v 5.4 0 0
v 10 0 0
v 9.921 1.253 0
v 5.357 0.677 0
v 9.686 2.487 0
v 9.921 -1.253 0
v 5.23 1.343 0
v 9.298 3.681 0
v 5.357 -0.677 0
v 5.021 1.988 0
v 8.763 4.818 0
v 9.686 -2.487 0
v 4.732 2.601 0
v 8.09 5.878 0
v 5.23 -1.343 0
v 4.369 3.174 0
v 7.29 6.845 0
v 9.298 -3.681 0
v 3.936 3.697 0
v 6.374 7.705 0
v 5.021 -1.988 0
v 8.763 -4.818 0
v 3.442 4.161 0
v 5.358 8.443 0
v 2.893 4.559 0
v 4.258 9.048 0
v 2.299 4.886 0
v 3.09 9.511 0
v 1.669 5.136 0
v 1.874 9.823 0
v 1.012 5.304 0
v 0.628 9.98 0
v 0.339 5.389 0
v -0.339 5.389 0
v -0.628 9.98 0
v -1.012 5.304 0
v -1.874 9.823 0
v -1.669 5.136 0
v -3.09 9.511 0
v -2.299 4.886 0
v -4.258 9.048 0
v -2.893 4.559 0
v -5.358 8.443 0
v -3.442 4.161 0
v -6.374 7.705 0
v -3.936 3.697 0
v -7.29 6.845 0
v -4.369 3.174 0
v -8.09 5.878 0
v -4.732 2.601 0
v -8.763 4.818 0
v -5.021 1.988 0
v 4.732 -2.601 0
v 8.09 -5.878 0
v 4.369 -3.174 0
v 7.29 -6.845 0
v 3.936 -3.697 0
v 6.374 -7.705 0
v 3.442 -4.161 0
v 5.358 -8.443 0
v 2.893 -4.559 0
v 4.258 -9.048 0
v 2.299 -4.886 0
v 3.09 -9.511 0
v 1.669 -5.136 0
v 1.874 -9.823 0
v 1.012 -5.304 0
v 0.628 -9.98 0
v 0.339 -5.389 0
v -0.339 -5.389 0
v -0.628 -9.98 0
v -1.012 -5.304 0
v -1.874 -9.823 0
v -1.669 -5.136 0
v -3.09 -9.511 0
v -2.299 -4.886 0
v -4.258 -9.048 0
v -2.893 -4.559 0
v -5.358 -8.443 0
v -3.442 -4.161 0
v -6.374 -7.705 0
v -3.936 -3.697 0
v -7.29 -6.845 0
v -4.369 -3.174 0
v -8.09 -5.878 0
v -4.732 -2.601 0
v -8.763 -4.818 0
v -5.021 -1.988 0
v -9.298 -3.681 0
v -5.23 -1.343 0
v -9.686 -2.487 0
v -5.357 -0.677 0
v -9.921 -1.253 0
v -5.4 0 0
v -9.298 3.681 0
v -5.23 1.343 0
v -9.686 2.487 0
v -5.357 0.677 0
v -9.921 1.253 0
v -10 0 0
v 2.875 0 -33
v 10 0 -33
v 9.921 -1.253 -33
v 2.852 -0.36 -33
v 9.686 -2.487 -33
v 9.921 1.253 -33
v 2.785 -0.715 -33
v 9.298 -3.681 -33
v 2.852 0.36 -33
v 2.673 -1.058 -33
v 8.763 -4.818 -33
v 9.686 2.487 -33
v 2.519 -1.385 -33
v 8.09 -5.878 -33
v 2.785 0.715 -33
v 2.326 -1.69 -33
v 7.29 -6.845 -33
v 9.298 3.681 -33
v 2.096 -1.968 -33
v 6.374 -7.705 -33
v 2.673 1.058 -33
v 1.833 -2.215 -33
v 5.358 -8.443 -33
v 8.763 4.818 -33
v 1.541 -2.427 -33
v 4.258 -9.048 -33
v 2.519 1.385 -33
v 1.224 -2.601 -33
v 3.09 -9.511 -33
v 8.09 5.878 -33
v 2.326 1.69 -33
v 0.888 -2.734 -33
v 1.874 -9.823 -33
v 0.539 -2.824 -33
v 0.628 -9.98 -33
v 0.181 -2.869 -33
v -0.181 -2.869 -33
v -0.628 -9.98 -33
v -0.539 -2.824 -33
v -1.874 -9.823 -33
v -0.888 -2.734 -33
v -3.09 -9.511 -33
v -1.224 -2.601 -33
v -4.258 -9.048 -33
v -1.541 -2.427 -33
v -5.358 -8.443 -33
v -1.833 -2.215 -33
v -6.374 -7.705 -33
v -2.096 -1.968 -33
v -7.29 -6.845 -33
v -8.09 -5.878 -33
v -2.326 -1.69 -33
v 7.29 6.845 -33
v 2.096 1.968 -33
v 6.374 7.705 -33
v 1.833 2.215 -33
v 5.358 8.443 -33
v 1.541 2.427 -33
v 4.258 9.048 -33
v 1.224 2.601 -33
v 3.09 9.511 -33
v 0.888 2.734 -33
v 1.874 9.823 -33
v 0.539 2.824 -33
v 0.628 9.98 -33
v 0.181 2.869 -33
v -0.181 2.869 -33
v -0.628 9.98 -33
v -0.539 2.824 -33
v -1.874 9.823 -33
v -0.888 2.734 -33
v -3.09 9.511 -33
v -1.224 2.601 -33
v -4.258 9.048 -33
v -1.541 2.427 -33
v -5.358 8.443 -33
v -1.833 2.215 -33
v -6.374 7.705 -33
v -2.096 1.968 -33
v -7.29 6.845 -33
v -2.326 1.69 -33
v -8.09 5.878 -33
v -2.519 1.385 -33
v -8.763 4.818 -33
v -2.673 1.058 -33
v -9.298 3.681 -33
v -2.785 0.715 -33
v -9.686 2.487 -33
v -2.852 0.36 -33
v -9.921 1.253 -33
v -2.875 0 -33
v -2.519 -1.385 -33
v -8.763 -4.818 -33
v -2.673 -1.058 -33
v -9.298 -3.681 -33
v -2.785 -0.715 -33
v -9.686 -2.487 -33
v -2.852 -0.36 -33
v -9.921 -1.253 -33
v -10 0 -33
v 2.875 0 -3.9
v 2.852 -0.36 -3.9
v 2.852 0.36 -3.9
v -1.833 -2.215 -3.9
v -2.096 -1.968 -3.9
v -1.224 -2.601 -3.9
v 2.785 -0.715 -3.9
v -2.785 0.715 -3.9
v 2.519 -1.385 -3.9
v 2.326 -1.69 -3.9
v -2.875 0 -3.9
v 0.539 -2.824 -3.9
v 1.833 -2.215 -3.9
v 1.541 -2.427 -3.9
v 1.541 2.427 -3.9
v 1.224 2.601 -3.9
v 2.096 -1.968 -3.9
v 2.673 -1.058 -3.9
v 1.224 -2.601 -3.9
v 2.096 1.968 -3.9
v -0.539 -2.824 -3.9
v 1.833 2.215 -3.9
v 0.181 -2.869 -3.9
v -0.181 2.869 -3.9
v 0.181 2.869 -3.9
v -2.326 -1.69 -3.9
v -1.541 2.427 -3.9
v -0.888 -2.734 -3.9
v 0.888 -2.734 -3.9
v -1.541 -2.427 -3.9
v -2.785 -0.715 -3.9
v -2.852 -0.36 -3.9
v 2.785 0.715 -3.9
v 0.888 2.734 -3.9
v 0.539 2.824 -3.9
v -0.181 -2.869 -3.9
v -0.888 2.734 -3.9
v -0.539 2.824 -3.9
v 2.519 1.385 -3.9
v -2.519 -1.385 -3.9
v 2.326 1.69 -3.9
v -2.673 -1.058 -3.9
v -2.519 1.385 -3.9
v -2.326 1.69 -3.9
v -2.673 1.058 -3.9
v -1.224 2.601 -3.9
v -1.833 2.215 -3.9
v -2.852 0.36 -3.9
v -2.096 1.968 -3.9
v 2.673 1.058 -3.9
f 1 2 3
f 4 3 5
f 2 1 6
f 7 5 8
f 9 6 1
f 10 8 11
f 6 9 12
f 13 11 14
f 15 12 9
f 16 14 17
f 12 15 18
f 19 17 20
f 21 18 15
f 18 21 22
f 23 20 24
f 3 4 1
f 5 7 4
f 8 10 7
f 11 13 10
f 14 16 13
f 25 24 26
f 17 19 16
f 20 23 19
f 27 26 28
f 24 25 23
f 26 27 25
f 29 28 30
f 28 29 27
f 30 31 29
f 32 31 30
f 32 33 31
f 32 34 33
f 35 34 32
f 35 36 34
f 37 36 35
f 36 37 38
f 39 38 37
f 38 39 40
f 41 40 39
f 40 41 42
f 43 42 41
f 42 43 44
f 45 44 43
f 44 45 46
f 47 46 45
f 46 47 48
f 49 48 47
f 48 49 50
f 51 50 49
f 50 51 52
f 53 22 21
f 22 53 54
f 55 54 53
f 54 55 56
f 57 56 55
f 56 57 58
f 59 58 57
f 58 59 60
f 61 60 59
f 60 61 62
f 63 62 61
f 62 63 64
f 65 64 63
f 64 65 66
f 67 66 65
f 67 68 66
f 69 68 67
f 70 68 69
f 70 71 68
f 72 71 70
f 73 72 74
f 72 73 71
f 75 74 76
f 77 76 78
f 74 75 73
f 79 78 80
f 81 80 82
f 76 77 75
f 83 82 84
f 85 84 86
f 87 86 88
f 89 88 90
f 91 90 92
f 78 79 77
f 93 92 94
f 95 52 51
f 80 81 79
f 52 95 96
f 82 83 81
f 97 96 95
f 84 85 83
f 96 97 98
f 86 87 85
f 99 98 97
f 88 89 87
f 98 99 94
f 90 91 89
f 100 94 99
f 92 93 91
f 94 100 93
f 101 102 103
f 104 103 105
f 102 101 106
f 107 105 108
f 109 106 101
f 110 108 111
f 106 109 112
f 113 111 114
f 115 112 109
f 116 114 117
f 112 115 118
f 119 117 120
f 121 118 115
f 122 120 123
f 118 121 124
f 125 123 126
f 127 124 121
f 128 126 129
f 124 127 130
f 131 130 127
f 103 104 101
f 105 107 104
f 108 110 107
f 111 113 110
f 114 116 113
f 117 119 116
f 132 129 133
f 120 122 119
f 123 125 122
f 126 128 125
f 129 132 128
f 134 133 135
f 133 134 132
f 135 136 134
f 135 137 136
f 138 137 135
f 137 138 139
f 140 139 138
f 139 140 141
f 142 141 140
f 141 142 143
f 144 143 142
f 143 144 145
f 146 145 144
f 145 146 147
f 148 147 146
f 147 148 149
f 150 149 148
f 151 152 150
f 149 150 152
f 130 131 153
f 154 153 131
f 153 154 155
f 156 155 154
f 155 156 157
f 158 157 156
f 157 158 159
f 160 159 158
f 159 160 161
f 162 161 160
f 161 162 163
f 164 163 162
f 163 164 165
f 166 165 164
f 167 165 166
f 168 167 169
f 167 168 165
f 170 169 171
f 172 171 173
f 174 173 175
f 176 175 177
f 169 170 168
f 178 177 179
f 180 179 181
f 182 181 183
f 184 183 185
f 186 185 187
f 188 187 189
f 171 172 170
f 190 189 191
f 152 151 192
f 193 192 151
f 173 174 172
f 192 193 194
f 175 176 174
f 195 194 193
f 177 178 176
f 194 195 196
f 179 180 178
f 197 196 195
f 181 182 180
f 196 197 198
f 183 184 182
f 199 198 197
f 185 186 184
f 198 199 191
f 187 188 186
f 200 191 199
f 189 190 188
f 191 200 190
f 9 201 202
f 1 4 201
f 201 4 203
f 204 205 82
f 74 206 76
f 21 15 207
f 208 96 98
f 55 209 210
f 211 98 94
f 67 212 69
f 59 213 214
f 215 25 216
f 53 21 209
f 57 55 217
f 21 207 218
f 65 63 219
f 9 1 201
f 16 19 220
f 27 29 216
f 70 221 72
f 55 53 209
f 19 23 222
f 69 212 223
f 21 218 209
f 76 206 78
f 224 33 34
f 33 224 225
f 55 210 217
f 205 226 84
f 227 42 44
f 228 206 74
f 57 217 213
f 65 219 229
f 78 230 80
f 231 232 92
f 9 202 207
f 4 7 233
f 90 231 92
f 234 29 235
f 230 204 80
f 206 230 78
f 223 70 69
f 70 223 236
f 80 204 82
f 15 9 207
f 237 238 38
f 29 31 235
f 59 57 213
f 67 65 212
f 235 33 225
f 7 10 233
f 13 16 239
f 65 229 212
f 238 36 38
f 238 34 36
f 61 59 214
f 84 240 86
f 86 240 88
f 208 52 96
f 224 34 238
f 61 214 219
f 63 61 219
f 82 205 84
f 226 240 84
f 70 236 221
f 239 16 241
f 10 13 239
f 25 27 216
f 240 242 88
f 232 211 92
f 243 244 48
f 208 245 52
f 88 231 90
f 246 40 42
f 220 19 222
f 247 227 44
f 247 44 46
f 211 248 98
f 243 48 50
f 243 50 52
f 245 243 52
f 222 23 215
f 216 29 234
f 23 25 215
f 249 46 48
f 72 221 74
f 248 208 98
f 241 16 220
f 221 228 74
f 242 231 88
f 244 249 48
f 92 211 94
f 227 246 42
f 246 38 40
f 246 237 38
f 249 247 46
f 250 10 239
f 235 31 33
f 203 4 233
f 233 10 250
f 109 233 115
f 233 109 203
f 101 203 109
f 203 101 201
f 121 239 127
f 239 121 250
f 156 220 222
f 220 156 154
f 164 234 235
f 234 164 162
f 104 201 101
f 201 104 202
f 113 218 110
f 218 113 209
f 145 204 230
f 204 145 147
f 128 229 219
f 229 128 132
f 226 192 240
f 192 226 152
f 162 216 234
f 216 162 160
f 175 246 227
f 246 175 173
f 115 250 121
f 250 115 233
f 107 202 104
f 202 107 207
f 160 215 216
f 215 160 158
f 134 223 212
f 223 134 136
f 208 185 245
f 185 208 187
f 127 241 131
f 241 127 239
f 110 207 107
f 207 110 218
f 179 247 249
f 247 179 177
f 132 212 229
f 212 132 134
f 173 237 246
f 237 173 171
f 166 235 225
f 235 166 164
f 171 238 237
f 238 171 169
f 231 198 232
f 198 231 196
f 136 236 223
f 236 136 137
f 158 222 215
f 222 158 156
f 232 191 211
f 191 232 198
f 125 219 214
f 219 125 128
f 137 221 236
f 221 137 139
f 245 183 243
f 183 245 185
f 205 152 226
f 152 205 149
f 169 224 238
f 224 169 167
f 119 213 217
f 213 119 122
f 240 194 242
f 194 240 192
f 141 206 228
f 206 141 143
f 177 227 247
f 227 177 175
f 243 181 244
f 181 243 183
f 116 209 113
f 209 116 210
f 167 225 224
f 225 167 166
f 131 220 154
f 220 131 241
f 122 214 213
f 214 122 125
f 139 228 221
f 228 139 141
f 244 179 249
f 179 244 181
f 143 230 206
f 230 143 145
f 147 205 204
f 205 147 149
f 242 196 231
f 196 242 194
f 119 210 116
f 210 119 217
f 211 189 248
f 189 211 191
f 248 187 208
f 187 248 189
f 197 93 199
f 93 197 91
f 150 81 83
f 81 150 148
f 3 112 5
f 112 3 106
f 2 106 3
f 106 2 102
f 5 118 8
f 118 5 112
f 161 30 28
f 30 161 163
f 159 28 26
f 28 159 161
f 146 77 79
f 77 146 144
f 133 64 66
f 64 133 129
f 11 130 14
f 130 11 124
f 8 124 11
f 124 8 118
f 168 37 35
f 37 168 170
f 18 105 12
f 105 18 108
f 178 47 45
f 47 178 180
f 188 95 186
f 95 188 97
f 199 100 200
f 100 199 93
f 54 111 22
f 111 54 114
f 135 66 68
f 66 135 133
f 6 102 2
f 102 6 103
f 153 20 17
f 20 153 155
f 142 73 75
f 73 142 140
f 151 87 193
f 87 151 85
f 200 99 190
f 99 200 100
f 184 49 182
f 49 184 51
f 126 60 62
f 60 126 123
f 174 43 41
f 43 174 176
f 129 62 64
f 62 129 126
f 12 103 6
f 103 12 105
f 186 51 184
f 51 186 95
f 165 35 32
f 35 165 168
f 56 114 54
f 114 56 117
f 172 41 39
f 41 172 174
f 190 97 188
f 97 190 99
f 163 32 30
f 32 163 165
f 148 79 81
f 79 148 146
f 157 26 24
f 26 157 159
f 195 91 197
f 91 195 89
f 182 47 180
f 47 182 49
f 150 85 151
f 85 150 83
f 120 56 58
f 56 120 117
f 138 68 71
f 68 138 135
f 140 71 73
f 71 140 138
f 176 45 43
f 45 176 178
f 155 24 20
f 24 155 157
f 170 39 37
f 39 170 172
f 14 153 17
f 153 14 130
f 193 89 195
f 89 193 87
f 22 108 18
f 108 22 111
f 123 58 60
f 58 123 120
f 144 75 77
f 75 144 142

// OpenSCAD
$fn = 50;


difference() {
	union() {
		translate(v = [0, 0, -33.0000000000]) {
			cylinder(h = 33, r = 10.0000000000);
		}
		cylinder(h = 0, r = 20.0000000000);
	}
	union() {
		translate(v = [0, 0, 0]) {
			rotate(a = [0, 0, 0]) {
				difference() {
					union() {
						#translate(v = [0, 0, -33.0000000000]) {
							cylinder(h = 33, r = 2.6000000000);
						}
						#translate(v = [0, 0, -3.9000000000]) {
							cylinder(h = 3.9000000000, r1 = 2.8750000000, r2 = 5.4000000000);
						}
						#translate(v = [0, 0, -33.0000000000]) {
							cylinder(h = 33, r = 2.8750000000);
						}
						#translate(v = [0, 0, -33.0000000000]) {
							cylinder(h = 33, r = 2.6000000000);
						}
					}
					union();
				}
			}
		}
	}
}
